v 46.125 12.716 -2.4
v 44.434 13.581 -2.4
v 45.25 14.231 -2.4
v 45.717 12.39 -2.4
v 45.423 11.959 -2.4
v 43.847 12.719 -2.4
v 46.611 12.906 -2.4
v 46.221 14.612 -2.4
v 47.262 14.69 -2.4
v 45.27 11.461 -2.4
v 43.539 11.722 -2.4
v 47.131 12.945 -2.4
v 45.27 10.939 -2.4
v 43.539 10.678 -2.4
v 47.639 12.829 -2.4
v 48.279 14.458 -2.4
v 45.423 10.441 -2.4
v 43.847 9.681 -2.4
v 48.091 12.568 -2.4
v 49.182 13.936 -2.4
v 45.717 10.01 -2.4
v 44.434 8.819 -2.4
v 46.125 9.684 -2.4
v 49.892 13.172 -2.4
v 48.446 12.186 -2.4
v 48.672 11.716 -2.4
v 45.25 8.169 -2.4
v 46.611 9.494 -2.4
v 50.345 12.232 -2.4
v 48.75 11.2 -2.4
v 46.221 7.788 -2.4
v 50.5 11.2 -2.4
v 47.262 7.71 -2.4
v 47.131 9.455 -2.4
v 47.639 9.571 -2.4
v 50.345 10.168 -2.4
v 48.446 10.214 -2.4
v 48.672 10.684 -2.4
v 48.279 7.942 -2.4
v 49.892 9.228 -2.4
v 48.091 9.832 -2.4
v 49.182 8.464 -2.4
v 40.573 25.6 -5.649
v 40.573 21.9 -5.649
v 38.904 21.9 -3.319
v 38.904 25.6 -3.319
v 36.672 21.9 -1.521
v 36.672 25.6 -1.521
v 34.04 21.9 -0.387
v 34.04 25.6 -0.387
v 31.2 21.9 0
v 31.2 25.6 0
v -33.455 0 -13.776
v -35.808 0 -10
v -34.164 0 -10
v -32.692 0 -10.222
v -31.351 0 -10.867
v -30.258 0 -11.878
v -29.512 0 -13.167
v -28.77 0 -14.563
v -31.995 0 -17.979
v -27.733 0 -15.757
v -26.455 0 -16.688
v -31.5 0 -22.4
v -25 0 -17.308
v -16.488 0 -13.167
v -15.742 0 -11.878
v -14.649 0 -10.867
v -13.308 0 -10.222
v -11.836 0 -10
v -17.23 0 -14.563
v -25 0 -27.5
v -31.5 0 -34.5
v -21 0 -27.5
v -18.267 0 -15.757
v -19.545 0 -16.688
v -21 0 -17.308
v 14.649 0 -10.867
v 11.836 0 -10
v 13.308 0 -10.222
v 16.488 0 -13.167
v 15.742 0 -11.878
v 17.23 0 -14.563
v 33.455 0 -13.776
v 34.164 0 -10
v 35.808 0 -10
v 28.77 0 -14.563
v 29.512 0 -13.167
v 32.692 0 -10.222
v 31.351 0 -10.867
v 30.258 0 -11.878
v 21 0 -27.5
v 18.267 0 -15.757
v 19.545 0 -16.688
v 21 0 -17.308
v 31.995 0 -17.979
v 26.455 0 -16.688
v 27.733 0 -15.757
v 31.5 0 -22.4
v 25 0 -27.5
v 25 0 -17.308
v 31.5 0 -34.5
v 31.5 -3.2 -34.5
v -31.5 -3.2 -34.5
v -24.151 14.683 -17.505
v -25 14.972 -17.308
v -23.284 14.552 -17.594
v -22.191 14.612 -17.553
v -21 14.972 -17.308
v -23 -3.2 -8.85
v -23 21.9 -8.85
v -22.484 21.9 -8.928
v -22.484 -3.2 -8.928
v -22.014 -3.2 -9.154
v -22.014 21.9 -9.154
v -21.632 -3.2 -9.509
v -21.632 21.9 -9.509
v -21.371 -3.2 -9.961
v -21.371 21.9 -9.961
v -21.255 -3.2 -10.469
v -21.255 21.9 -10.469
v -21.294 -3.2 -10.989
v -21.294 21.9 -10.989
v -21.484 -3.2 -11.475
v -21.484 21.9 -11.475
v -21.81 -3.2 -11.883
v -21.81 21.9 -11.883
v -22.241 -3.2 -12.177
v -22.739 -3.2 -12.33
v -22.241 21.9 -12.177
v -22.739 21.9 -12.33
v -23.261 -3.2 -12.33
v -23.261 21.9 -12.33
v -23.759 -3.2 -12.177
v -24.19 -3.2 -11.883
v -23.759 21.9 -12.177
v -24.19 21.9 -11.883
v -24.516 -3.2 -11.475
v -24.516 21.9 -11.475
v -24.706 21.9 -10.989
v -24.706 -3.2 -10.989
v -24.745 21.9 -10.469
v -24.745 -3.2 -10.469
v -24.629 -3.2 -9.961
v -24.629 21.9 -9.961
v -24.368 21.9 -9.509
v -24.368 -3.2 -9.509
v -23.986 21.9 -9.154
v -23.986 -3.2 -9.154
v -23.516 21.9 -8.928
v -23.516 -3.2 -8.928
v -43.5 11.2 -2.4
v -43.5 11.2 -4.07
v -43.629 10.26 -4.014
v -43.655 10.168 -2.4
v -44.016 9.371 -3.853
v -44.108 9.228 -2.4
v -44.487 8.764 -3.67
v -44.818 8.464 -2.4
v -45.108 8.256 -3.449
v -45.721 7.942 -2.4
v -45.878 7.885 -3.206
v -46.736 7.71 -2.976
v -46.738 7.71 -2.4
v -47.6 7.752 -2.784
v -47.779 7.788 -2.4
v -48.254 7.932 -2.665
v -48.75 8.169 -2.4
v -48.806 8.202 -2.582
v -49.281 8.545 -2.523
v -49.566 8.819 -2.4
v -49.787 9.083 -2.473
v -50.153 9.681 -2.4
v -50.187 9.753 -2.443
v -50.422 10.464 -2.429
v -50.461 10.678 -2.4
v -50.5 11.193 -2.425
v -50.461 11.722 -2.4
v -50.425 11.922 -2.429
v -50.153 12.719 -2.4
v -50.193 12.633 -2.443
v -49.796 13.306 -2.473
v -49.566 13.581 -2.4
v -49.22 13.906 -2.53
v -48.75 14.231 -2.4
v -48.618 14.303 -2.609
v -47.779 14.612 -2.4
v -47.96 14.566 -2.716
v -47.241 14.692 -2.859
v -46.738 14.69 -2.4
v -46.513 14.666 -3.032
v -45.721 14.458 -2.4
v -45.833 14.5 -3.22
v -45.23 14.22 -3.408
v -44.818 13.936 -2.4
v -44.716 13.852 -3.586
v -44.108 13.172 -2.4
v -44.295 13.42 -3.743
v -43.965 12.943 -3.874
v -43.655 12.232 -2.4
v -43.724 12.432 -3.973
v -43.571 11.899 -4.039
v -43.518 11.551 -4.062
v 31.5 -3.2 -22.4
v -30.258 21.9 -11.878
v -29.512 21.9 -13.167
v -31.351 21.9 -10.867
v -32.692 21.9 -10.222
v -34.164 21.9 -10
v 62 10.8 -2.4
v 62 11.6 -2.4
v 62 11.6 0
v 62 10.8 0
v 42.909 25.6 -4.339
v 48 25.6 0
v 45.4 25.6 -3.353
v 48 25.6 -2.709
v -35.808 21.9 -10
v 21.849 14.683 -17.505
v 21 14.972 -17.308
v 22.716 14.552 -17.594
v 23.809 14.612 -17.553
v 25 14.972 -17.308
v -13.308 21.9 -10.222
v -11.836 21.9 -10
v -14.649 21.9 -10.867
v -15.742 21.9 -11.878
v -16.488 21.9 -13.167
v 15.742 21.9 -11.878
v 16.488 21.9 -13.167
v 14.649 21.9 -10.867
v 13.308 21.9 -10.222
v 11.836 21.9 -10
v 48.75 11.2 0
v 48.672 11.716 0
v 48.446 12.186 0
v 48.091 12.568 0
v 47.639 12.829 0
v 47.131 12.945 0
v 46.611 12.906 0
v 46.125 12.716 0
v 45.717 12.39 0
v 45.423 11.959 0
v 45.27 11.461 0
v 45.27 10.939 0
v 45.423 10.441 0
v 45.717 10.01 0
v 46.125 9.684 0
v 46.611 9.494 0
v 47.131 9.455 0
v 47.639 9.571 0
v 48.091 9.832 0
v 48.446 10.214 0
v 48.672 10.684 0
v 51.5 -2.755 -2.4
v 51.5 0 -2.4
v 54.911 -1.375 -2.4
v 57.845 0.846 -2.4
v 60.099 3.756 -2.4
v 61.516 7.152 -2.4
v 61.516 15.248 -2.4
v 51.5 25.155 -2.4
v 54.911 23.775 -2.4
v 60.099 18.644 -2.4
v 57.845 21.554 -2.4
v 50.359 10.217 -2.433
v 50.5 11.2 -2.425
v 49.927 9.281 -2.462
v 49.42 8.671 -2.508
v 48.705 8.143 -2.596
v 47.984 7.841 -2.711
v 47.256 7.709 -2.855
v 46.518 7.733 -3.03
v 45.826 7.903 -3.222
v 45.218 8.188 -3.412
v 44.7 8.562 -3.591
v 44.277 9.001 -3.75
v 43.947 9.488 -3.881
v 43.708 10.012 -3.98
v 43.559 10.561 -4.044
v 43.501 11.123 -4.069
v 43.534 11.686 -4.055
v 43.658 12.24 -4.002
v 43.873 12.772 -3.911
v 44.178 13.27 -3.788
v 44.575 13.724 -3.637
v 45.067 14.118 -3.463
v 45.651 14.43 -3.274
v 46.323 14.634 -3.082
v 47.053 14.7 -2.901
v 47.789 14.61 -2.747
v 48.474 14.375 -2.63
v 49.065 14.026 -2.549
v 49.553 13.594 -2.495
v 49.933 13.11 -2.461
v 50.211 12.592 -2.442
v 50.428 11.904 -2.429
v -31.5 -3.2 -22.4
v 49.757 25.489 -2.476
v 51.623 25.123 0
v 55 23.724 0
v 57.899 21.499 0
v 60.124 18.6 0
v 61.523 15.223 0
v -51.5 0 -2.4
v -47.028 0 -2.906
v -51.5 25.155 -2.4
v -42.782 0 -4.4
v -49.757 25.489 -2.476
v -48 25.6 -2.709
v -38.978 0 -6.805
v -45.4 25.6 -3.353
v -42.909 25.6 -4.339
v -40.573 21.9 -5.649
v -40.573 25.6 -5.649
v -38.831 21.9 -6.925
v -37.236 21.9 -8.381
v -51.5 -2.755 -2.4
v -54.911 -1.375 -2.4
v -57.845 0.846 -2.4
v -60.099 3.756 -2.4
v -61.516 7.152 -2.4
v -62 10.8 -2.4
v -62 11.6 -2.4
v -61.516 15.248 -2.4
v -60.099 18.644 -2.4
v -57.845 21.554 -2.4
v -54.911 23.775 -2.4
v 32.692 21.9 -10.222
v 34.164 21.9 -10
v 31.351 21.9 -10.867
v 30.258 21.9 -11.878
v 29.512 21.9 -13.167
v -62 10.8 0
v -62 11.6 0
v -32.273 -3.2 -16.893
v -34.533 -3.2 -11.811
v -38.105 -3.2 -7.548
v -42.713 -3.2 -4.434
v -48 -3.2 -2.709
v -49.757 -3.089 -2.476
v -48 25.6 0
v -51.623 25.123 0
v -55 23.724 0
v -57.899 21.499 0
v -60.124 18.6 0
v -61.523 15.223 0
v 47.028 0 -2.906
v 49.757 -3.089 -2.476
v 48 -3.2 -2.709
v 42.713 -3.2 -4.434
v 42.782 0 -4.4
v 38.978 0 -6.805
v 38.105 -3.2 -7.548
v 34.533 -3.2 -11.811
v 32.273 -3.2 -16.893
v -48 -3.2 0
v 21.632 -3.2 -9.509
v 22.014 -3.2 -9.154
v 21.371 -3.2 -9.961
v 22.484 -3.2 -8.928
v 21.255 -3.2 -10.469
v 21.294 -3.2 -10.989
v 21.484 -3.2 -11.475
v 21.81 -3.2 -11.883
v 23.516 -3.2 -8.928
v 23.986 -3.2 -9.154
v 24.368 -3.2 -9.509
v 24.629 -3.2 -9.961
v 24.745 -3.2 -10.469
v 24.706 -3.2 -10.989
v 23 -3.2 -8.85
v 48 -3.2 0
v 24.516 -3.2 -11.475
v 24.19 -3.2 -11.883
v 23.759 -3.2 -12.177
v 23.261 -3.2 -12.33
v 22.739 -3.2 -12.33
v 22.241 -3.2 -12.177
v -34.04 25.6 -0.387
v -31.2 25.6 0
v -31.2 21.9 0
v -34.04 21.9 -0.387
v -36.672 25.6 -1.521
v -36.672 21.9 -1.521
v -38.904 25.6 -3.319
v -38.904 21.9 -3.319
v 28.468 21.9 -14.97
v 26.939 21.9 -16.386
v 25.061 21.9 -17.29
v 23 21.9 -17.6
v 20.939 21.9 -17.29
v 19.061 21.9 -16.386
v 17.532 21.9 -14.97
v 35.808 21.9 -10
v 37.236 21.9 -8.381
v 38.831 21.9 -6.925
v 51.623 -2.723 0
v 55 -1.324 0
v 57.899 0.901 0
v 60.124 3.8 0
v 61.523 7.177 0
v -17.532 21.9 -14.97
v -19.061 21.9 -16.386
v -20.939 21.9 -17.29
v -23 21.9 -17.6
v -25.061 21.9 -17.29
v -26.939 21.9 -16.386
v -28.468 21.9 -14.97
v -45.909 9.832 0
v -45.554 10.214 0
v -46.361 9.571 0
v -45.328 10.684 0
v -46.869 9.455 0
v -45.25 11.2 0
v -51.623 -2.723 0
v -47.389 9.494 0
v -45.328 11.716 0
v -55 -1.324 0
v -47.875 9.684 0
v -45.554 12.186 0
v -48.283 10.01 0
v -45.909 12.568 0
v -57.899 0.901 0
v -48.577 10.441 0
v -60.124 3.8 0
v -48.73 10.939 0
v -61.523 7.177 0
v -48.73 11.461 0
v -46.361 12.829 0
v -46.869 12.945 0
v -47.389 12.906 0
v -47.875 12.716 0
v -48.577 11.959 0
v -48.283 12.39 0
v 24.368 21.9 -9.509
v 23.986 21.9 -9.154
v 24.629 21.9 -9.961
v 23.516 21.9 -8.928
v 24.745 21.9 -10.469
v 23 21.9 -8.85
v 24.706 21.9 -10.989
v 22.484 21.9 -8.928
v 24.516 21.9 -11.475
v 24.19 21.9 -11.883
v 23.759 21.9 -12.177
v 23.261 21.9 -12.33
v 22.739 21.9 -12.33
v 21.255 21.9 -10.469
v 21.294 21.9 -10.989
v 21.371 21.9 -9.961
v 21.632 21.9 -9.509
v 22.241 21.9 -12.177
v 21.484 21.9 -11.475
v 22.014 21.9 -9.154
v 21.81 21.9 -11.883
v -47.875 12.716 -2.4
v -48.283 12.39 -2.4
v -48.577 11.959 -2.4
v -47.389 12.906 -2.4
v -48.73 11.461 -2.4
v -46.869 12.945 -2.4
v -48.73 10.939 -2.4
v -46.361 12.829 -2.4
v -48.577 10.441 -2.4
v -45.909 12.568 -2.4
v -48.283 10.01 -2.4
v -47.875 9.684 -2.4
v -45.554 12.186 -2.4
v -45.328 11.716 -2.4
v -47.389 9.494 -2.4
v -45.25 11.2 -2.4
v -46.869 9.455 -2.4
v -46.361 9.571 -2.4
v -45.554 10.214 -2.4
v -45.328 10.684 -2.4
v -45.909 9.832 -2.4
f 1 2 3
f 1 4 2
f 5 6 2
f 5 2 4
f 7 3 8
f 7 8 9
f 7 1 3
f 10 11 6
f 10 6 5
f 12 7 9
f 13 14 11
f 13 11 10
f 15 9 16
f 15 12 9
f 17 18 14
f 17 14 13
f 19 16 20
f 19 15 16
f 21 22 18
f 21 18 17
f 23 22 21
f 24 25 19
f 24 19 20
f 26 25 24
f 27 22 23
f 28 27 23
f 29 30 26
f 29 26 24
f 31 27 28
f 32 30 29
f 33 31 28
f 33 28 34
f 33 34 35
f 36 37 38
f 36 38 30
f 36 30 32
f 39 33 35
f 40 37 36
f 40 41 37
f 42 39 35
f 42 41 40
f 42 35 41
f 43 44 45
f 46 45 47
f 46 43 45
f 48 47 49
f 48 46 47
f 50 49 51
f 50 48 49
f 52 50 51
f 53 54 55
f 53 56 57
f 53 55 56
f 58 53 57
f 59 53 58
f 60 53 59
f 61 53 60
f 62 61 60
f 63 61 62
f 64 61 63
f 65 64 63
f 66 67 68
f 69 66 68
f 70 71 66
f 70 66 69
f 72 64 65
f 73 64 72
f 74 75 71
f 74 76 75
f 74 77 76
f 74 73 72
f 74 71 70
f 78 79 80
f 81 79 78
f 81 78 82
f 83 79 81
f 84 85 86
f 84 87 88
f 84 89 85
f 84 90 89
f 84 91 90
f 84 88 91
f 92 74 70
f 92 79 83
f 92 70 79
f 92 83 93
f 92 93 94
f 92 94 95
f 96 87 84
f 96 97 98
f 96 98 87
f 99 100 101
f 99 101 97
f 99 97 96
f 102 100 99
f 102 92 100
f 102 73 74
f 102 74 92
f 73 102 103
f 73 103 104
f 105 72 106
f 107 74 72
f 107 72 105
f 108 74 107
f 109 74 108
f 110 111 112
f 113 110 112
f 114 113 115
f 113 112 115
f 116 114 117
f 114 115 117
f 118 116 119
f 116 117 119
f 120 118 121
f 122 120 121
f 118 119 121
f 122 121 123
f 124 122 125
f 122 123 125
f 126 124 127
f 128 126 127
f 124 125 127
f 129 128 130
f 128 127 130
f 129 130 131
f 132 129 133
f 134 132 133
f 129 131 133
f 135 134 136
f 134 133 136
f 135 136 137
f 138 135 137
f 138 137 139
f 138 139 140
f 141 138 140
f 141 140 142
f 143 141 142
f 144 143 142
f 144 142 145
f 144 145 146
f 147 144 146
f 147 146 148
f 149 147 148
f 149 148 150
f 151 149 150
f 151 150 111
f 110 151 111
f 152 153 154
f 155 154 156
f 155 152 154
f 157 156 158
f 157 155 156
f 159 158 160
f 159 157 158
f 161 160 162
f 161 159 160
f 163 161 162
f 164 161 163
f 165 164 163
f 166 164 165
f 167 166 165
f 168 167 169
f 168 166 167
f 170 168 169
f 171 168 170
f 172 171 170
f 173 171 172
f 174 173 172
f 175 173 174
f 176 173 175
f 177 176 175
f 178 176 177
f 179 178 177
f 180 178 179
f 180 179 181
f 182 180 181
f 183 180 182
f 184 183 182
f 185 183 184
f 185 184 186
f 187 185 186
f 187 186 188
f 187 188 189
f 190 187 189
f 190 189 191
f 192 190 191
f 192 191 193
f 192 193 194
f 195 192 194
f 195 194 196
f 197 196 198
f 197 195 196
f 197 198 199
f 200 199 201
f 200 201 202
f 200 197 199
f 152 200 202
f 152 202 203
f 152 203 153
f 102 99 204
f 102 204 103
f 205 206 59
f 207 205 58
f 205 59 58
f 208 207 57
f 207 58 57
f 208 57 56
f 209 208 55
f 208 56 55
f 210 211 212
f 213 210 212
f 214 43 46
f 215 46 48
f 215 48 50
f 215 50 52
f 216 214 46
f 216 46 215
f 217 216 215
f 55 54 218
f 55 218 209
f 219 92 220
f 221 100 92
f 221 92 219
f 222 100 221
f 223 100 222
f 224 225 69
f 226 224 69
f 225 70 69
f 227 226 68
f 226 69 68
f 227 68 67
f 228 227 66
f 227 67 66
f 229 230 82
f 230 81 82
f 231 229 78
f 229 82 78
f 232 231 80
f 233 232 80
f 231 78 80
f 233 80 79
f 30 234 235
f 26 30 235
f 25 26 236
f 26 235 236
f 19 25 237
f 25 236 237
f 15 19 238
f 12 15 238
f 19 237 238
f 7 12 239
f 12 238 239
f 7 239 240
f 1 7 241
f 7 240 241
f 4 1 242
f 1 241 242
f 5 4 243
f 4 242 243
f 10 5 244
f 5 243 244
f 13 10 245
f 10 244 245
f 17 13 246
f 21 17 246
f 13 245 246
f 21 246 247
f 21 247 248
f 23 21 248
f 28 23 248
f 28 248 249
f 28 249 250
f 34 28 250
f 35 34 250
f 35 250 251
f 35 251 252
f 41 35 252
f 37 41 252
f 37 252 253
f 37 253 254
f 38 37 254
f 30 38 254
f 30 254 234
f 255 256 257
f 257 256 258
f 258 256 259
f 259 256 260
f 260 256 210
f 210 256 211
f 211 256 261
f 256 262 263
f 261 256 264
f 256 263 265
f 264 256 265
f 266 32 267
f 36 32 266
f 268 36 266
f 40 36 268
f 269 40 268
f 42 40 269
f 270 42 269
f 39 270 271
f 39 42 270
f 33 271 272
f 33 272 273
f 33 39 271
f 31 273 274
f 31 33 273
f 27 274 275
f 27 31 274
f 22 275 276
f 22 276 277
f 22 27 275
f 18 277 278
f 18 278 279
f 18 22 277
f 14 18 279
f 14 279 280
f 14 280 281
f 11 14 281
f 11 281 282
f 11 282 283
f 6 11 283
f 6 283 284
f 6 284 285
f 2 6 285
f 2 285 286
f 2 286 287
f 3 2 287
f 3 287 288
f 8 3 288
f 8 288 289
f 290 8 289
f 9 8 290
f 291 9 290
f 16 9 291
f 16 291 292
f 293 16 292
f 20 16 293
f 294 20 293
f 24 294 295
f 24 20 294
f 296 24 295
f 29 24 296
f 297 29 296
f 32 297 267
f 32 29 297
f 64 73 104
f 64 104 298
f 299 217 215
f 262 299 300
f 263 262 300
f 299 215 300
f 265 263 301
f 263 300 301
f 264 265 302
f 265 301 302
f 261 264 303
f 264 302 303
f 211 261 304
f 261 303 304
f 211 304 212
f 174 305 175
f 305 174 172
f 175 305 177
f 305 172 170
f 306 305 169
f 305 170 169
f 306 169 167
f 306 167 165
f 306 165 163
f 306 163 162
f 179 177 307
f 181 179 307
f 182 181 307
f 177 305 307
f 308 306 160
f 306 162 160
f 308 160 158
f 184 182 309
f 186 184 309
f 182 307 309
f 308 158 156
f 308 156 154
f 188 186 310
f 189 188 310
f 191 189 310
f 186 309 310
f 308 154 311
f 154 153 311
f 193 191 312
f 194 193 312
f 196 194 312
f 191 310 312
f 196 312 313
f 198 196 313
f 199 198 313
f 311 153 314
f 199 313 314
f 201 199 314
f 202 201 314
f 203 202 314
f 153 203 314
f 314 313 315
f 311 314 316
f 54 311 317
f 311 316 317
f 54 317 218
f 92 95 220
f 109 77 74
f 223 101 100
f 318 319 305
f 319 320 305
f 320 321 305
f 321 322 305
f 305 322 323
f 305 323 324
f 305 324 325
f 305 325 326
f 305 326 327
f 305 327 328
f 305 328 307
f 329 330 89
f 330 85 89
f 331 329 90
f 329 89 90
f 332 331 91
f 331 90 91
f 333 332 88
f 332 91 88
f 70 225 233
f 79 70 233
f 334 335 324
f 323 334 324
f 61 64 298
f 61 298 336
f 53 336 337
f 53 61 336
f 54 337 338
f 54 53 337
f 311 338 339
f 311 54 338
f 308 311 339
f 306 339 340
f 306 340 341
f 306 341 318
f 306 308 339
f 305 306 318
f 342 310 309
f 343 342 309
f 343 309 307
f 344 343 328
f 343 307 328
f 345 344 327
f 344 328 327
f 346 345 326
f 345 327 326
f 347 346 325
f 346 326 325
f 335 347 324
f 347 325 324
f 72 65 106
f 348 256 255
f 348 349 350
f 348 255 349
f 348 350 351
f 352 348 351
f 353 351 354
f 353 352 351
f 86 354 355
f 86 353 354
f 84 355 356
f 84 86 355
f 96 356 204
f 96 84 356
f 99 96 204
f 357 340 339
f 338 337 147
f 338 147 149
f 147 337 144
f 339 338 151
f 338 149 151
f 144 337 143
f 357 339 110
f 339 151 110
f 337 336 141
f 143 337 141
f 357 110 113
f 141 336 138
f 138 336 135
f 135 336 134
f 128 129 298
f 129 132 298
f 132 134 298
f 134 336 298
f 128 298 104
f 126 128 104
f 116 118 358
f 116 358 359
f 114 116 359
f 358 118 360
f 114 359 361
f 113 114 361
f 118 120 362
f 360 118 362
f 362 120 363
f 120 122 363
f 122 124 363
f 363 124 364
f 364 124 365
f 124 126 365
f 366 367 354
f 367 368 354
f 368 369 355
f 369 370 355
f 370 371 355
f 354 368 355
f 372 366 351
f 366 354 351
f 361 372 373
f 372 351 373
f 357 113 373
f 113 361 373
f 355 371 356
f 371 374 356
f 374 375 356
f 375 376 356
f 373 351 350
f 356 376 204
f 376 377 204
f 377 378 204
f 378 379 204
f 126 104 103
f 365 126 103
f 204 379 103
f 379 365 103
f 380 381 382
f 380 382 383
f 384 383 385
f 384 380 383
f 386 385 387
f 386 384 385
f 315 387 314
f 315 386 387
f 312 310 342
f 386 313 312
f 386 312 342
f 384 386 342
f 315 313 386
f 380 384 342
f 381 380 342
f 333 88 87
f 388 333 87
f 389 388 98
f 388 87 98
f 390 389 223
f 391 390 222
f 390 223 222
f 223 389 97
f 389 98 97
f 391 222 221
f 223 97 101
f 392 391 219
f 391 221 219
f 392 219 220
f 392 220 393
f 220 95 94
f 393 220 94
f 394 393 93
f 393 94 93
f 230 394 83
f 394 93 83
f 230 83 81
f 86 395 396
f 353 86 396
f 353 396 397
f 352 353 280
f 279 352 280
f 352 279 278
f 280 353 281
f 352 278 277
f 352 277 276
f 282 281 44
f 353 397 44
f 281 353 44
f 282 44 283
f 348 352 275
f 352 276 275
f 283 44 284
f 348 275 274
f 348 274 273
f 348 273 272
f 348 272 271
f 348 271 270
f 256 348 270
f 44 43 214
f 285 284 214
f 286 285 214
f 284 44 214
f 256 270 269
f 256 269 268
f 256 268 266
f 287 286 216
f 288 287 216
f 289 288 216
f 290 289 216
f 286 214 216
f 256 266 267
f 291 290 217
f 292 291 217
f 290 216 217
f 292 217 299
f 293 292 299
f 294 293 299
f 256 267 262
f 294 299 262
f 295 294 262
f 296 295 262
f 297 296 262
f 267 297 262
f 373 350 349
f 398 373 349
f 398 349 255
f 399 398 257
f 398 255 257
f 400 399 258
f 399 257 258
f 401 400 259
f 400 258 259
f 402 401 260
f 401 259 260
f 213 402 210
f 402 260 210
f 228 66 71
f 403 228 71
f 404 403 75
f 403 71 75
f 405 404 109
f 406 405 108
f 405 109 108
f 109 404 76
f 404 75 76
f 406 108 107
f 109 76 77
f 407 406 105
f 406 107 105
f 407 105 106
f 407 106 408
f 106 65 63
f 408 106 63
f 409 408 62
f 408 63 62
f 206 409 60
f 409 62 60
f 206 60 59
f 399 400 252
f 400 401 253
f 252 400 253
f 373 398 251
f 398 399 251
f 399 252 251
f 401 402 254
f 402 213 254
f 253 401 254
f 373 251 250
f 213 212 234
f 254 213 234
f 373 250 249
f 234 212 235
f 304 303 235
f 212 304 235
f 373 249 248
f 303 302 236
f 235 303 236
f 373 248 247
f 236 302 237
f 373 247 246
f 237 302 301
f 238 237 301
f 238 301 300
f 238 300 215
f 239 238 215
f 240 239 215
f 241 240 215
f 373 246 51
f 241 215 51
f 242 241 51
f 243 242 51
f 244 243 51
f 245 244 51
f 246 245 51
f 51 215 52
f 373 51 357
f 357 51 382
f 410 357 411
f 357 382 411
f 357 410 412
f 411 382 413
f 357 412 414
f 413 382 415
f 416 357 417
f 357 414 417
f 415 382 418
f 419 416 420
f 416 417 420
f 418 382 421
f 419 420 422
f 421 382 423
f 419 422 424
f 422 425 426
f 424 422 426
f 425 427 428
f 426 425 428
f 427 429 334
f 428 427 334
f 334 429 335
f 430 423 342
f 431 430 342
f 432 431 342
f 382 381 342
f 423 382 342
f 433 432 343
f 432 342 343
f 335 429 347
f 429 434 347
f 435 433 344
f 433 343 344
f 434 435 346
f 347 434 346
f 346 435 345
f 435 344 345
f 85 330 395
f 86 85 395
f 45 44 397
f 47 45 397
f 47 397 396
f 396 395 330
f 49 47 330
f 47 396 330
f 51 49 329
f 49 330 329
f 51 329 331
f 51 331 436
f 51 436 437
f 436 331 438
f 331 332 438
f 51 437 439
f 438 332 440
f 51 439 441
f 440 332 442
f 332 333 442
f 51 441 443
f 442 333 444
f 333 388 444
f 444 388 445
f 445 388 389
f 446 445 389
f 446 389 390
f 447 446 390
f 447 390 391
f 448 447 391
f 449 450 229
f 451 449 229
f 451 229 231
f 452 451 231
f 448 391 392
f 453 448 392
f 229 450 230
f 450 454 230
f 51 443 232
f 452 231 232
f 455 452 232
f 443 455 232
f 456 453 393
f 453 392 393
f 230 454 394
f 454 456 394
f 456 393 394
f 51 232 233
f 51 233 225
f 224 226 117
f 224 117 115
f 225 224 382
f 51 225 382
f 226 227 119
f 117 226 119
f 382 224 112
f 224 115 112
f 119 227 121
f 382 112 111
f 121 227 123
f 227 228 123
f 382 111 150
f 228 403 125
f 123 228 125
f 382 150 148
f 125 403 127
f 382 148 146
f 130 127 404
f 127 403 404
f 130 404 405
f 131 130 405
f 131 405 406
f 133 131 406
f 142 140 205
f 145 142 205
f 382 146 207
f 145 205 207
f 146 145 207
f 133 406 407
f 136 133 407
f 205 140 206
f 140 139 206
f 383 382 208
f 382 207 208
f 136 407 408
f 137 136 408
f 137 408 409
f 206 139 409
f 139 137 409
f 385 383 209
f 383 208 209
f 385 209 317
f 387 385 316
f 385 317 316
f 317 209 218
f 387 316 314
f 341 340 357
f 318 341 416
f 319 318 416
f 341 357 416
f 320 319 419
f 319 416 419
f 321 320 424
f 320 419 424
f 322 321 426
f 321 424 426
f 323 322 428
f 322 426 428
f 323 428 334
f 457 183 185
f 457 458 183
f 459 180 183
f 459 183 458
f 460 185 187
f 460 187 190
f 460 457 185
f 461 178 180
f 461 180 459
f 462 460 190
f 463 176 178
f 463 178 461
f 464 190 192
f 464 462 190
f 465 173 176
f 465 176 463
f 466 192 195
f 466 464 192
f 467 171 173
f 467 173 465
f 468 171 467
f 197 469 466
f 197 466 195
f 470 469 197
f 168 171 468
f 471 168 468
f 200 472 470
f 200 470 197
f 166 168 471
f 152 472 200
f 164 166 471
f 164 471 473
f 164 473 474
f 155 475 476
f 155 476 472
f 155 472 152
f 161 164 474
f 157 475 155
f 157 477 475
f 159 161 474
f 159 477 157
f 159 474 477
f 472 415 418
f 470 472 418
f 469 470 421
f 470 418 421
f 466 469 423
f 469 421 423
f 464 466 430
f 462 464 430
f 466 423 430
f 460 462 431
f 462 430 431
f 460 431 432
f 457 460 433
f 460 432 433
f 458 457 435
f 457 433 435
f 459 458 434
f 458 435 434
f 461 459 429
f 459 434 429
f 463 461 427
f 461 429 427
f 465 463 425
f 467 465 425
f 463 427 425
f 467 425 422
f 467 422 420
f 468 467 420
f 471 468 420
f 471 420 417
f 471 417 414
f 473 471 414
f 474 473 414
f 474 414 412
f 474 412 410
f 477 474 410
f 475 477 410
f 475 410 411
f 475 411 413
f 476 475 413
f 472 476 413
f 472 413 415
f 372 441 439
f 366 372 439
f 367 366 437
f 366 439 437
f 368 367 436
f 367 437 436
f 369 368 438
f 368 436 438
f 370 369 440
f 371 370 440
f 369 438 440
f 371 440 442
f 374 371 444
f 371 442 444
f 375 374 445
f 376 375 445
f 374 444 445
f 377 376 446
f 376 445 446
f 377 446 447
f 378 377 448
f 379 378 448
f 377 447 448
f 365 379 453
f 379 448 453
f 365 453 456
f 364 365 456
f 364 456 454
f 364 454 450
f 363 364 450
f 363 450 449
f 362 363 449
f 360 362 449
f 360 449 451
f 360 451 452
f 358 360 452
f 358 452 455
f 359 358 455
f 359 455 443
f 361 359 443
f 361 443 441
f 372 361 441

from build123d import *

# Parameters (mm, degrees)
BOSS_EXTRUDE1_DEPTH = 3.2
BOSS_EXTRUDE2_START = 25.6
BOSS_EXTRUDE2_DEPTH = 25.6
SKETCH9_R           = 7
BOSS_EXTRUDE3_DEPTH = 25.6
BOSS_EXTRUDE4_DEPTH = 2
BOSS_EXTRUDE5_START = -46
BOSS_EXTRUDE5_DEPTH = 2
FILLET2_R           = 14
SKETCH12_R          = 1.75
CUT_EXTRUDE1_DEPTH  = 76.429503628
SKETCH15_R          = 3.5
CUT_EXTRUDE4_DEPTH  = 75.362423424
SKETCH16_R          = 1.75
CUT_EXTRUDE5_DEPTH  = 77.574734855
CUT_EXTRUDE6_DEPTH  = 3.7
FILLET3_R           = 5


with BuildPart() as part:
    # Sketch5 → Boss-Extrude1 (new body)
    with BuildSketch(Plane(origin=(0, 0, 0), x_dir=(1, 0, 0), z_dir=(0, 1, 0))):
        with BuildLine():
            Line((-62, 0), (62, 0))
            Line((62, 0), (62, 2.4))
            Line((62, 2.4), (51.5, 2.4))
            ThreePointArc((51.5, 2.4), (37.357864376, 8.257864376), (31.5, 22.4))
            Line((31.5, 22.4), (31.5, 34.5))
            Line((31.5, 34.5), (-31.5, 34.5))
            Line((-31.5, 34.5), (-31.5, 22.4))
            ThreePointArc((-31.5, 22.4), (-37.357864376, 8.257864376), (-51.5, 2.4))
            Line((-51.5, 2.4), (-62, 2.4))
            Line((-62, 2.4), (-62, 0))
        make_face()
    extrude(amount=-BOSS_EXTRUDE1_DEPTH)

    # Sketch8 → Boss-Extrude2 (add)
    with BuildSketch(Plane(origin=(0, 0, 0), x_dir=(1, 0, 0), z_dir=(0, 1, 0)).offset(BOSS_EXTRUDE2_START)):
        with BuildLine():
            Line((-35.807963803, 10), (35.807963803, 10))
            ThreePointArc((35.807963803, 10), (42.782202113, 4.4), (51.5, 2.4))
            Line((51.5, 2.4), (62, 2.4))
            Line((62, 2.4), (62, 0))
            Line((62, 0), (-62, 0))
            Line((-62, 0), (-62, 2.4))
            Line((-62, 2.4), (-51.5, 2.4))
            ThreePointArc((-51.5, 2.4), (-42.782202113, 4.4), (-35.807963803, 10))
        make_face()
    extrude(amount=-BOSS_EXTRUDE2_DEPTH)

    # Sketch9 → Boss-Extrude3 (add)
    with BuildSketch(Plane(origin=(0, 0, 0), x_dir=(1, 0, 0), z_dir=(0, 1, 0))):
        with Locations((-23, 10.6)):
            Circle(SKETCH9_R)
        with Locations((23, 10.6)):
            Circle(SKETCH9_R)
    extrude(amount=BOSS_EXTRUDE3_DEPTH)

    # Sketch10 → Boss-Extrude4 (add, symmetric)
    with BuildSketch(Plane(origin=(23, 0, 0), x_dir=(0, 0, -1), z_dir=(1, 0, 0))):
        Polygon((16.2, 16.6), (16.2, 0), (27.5, 0), align=None)
    extrude(amount=BOSS_EXTRUDE4_DEPTH, both=True)

    # Sketch10<4> → Boss-Extrude5 (add, symmetric)
    with BuildSketch(Plane(origin=(23, 0, 0), x_dir=(0, 0, -1), z_dir=(1, 0, 0)).offset(BOSS_EXTRUDE5_START)):
        Polygon((16.2, 16.6), (16.2, 0), (27.5, 0), align=None)
    extrude(amount=BOSS_EXTRUDE5_DEPTH, both=True)

    # Fillet2
    fillet2_edges = [part.edges().sort_by_distance(p)[0] for p in [
        (62, -3.2, -1.2),
        (62, 25.6, -1.2),
        (-62, -3.2, -1.2),
        (-62, 25.6, -1.2),
    ]]
    fillet(fillet2_edges, radius=FILLET2_R)

    # Sketch12 → Cut-Extrude1 (cut, through all)
    with BuildSketch(Plane.XY):
        with Locations((-47, 11.2)):
            Circle(SKETCH12_R)
        with Locations((47, 11.2)):
            Circle(SKETCH12_R)
    extrude(amount=-CUT_EXTRUDE1_DEPTH, mode=Mode.SUBTRACT)

    # Sketch15 → Cut-Extrude4 (cut, through all)
    with BuildSketch(Plane(origin=(0, 0, -2.4), x_dir=(-1, 0, 0), z_dir=(0, 0, -1))):
        with Locations(Location((-47, 11.2, 0), (0, 0, 180))):
            Circle(SKETCH15_R)
        with Locations(Location((47, 11.2, 0), (0, 0, 180))):
            Circle(SKETCH15_R)
    extrude(amount=CUT_EXTRUDE4_DEPTH, mode=Mode.SUBTRACT)

    # Sketch16 → Cut-Extrude5 (cut, through all)
    with BuildSketch(Plane(origin=(0, 25.6, 0), x_dir=(1, 0, 0), z_dir=(0, 1, 0))):
        with Locations(Location((-23, 10.6, 0), (0, 0, 270))):
            Circle(SKETCH16_R)
        with Locations(Location((23, 10.6, 0), (0, 0, 270))):
            Circle(SKETCH16_R)
    extrude(amount=-CUT_EXTRUDE5_DEPTH, mode=Mode.SUBTRACT)

    # Sketch17 → Cut-Extrude6 (cut)
    with BuildSketch(Plane(origin=(0, 25.6, 0), x_dir=(1, 0, 0), z_dir=(0, 1, 0))):
        with BuildLine():
            Line((-31.2, 21.2), (31.2, 21.2))
            ThreePointArc((31.2, 21.2), (41.8, 10.6), (31.2, 0))
            Line((31.2, 0), (-31.2, 0))
            ThreePointArc((-31.2, 0), (-41.8, 10.6), (-31.2, 21.2))
        make_face()
    extrude(amount=-CUT_EXTRUDE6_DEPTH, mode=Mode.SUBTRACT)

    # Fillet3
    fillet3_edges = [part.edges().sort_by_distance(p)[0] for p in [
        (16.02576169, 10.95, -10),
        (-29.97423831, 10.95, -10),
        (-16.02576169, 10.95, -10),
        (29.97423831, 10.95, -10),
    ]]
    fillet(fillet3_edges, radius=FILLET3_R)


solid = part.part
